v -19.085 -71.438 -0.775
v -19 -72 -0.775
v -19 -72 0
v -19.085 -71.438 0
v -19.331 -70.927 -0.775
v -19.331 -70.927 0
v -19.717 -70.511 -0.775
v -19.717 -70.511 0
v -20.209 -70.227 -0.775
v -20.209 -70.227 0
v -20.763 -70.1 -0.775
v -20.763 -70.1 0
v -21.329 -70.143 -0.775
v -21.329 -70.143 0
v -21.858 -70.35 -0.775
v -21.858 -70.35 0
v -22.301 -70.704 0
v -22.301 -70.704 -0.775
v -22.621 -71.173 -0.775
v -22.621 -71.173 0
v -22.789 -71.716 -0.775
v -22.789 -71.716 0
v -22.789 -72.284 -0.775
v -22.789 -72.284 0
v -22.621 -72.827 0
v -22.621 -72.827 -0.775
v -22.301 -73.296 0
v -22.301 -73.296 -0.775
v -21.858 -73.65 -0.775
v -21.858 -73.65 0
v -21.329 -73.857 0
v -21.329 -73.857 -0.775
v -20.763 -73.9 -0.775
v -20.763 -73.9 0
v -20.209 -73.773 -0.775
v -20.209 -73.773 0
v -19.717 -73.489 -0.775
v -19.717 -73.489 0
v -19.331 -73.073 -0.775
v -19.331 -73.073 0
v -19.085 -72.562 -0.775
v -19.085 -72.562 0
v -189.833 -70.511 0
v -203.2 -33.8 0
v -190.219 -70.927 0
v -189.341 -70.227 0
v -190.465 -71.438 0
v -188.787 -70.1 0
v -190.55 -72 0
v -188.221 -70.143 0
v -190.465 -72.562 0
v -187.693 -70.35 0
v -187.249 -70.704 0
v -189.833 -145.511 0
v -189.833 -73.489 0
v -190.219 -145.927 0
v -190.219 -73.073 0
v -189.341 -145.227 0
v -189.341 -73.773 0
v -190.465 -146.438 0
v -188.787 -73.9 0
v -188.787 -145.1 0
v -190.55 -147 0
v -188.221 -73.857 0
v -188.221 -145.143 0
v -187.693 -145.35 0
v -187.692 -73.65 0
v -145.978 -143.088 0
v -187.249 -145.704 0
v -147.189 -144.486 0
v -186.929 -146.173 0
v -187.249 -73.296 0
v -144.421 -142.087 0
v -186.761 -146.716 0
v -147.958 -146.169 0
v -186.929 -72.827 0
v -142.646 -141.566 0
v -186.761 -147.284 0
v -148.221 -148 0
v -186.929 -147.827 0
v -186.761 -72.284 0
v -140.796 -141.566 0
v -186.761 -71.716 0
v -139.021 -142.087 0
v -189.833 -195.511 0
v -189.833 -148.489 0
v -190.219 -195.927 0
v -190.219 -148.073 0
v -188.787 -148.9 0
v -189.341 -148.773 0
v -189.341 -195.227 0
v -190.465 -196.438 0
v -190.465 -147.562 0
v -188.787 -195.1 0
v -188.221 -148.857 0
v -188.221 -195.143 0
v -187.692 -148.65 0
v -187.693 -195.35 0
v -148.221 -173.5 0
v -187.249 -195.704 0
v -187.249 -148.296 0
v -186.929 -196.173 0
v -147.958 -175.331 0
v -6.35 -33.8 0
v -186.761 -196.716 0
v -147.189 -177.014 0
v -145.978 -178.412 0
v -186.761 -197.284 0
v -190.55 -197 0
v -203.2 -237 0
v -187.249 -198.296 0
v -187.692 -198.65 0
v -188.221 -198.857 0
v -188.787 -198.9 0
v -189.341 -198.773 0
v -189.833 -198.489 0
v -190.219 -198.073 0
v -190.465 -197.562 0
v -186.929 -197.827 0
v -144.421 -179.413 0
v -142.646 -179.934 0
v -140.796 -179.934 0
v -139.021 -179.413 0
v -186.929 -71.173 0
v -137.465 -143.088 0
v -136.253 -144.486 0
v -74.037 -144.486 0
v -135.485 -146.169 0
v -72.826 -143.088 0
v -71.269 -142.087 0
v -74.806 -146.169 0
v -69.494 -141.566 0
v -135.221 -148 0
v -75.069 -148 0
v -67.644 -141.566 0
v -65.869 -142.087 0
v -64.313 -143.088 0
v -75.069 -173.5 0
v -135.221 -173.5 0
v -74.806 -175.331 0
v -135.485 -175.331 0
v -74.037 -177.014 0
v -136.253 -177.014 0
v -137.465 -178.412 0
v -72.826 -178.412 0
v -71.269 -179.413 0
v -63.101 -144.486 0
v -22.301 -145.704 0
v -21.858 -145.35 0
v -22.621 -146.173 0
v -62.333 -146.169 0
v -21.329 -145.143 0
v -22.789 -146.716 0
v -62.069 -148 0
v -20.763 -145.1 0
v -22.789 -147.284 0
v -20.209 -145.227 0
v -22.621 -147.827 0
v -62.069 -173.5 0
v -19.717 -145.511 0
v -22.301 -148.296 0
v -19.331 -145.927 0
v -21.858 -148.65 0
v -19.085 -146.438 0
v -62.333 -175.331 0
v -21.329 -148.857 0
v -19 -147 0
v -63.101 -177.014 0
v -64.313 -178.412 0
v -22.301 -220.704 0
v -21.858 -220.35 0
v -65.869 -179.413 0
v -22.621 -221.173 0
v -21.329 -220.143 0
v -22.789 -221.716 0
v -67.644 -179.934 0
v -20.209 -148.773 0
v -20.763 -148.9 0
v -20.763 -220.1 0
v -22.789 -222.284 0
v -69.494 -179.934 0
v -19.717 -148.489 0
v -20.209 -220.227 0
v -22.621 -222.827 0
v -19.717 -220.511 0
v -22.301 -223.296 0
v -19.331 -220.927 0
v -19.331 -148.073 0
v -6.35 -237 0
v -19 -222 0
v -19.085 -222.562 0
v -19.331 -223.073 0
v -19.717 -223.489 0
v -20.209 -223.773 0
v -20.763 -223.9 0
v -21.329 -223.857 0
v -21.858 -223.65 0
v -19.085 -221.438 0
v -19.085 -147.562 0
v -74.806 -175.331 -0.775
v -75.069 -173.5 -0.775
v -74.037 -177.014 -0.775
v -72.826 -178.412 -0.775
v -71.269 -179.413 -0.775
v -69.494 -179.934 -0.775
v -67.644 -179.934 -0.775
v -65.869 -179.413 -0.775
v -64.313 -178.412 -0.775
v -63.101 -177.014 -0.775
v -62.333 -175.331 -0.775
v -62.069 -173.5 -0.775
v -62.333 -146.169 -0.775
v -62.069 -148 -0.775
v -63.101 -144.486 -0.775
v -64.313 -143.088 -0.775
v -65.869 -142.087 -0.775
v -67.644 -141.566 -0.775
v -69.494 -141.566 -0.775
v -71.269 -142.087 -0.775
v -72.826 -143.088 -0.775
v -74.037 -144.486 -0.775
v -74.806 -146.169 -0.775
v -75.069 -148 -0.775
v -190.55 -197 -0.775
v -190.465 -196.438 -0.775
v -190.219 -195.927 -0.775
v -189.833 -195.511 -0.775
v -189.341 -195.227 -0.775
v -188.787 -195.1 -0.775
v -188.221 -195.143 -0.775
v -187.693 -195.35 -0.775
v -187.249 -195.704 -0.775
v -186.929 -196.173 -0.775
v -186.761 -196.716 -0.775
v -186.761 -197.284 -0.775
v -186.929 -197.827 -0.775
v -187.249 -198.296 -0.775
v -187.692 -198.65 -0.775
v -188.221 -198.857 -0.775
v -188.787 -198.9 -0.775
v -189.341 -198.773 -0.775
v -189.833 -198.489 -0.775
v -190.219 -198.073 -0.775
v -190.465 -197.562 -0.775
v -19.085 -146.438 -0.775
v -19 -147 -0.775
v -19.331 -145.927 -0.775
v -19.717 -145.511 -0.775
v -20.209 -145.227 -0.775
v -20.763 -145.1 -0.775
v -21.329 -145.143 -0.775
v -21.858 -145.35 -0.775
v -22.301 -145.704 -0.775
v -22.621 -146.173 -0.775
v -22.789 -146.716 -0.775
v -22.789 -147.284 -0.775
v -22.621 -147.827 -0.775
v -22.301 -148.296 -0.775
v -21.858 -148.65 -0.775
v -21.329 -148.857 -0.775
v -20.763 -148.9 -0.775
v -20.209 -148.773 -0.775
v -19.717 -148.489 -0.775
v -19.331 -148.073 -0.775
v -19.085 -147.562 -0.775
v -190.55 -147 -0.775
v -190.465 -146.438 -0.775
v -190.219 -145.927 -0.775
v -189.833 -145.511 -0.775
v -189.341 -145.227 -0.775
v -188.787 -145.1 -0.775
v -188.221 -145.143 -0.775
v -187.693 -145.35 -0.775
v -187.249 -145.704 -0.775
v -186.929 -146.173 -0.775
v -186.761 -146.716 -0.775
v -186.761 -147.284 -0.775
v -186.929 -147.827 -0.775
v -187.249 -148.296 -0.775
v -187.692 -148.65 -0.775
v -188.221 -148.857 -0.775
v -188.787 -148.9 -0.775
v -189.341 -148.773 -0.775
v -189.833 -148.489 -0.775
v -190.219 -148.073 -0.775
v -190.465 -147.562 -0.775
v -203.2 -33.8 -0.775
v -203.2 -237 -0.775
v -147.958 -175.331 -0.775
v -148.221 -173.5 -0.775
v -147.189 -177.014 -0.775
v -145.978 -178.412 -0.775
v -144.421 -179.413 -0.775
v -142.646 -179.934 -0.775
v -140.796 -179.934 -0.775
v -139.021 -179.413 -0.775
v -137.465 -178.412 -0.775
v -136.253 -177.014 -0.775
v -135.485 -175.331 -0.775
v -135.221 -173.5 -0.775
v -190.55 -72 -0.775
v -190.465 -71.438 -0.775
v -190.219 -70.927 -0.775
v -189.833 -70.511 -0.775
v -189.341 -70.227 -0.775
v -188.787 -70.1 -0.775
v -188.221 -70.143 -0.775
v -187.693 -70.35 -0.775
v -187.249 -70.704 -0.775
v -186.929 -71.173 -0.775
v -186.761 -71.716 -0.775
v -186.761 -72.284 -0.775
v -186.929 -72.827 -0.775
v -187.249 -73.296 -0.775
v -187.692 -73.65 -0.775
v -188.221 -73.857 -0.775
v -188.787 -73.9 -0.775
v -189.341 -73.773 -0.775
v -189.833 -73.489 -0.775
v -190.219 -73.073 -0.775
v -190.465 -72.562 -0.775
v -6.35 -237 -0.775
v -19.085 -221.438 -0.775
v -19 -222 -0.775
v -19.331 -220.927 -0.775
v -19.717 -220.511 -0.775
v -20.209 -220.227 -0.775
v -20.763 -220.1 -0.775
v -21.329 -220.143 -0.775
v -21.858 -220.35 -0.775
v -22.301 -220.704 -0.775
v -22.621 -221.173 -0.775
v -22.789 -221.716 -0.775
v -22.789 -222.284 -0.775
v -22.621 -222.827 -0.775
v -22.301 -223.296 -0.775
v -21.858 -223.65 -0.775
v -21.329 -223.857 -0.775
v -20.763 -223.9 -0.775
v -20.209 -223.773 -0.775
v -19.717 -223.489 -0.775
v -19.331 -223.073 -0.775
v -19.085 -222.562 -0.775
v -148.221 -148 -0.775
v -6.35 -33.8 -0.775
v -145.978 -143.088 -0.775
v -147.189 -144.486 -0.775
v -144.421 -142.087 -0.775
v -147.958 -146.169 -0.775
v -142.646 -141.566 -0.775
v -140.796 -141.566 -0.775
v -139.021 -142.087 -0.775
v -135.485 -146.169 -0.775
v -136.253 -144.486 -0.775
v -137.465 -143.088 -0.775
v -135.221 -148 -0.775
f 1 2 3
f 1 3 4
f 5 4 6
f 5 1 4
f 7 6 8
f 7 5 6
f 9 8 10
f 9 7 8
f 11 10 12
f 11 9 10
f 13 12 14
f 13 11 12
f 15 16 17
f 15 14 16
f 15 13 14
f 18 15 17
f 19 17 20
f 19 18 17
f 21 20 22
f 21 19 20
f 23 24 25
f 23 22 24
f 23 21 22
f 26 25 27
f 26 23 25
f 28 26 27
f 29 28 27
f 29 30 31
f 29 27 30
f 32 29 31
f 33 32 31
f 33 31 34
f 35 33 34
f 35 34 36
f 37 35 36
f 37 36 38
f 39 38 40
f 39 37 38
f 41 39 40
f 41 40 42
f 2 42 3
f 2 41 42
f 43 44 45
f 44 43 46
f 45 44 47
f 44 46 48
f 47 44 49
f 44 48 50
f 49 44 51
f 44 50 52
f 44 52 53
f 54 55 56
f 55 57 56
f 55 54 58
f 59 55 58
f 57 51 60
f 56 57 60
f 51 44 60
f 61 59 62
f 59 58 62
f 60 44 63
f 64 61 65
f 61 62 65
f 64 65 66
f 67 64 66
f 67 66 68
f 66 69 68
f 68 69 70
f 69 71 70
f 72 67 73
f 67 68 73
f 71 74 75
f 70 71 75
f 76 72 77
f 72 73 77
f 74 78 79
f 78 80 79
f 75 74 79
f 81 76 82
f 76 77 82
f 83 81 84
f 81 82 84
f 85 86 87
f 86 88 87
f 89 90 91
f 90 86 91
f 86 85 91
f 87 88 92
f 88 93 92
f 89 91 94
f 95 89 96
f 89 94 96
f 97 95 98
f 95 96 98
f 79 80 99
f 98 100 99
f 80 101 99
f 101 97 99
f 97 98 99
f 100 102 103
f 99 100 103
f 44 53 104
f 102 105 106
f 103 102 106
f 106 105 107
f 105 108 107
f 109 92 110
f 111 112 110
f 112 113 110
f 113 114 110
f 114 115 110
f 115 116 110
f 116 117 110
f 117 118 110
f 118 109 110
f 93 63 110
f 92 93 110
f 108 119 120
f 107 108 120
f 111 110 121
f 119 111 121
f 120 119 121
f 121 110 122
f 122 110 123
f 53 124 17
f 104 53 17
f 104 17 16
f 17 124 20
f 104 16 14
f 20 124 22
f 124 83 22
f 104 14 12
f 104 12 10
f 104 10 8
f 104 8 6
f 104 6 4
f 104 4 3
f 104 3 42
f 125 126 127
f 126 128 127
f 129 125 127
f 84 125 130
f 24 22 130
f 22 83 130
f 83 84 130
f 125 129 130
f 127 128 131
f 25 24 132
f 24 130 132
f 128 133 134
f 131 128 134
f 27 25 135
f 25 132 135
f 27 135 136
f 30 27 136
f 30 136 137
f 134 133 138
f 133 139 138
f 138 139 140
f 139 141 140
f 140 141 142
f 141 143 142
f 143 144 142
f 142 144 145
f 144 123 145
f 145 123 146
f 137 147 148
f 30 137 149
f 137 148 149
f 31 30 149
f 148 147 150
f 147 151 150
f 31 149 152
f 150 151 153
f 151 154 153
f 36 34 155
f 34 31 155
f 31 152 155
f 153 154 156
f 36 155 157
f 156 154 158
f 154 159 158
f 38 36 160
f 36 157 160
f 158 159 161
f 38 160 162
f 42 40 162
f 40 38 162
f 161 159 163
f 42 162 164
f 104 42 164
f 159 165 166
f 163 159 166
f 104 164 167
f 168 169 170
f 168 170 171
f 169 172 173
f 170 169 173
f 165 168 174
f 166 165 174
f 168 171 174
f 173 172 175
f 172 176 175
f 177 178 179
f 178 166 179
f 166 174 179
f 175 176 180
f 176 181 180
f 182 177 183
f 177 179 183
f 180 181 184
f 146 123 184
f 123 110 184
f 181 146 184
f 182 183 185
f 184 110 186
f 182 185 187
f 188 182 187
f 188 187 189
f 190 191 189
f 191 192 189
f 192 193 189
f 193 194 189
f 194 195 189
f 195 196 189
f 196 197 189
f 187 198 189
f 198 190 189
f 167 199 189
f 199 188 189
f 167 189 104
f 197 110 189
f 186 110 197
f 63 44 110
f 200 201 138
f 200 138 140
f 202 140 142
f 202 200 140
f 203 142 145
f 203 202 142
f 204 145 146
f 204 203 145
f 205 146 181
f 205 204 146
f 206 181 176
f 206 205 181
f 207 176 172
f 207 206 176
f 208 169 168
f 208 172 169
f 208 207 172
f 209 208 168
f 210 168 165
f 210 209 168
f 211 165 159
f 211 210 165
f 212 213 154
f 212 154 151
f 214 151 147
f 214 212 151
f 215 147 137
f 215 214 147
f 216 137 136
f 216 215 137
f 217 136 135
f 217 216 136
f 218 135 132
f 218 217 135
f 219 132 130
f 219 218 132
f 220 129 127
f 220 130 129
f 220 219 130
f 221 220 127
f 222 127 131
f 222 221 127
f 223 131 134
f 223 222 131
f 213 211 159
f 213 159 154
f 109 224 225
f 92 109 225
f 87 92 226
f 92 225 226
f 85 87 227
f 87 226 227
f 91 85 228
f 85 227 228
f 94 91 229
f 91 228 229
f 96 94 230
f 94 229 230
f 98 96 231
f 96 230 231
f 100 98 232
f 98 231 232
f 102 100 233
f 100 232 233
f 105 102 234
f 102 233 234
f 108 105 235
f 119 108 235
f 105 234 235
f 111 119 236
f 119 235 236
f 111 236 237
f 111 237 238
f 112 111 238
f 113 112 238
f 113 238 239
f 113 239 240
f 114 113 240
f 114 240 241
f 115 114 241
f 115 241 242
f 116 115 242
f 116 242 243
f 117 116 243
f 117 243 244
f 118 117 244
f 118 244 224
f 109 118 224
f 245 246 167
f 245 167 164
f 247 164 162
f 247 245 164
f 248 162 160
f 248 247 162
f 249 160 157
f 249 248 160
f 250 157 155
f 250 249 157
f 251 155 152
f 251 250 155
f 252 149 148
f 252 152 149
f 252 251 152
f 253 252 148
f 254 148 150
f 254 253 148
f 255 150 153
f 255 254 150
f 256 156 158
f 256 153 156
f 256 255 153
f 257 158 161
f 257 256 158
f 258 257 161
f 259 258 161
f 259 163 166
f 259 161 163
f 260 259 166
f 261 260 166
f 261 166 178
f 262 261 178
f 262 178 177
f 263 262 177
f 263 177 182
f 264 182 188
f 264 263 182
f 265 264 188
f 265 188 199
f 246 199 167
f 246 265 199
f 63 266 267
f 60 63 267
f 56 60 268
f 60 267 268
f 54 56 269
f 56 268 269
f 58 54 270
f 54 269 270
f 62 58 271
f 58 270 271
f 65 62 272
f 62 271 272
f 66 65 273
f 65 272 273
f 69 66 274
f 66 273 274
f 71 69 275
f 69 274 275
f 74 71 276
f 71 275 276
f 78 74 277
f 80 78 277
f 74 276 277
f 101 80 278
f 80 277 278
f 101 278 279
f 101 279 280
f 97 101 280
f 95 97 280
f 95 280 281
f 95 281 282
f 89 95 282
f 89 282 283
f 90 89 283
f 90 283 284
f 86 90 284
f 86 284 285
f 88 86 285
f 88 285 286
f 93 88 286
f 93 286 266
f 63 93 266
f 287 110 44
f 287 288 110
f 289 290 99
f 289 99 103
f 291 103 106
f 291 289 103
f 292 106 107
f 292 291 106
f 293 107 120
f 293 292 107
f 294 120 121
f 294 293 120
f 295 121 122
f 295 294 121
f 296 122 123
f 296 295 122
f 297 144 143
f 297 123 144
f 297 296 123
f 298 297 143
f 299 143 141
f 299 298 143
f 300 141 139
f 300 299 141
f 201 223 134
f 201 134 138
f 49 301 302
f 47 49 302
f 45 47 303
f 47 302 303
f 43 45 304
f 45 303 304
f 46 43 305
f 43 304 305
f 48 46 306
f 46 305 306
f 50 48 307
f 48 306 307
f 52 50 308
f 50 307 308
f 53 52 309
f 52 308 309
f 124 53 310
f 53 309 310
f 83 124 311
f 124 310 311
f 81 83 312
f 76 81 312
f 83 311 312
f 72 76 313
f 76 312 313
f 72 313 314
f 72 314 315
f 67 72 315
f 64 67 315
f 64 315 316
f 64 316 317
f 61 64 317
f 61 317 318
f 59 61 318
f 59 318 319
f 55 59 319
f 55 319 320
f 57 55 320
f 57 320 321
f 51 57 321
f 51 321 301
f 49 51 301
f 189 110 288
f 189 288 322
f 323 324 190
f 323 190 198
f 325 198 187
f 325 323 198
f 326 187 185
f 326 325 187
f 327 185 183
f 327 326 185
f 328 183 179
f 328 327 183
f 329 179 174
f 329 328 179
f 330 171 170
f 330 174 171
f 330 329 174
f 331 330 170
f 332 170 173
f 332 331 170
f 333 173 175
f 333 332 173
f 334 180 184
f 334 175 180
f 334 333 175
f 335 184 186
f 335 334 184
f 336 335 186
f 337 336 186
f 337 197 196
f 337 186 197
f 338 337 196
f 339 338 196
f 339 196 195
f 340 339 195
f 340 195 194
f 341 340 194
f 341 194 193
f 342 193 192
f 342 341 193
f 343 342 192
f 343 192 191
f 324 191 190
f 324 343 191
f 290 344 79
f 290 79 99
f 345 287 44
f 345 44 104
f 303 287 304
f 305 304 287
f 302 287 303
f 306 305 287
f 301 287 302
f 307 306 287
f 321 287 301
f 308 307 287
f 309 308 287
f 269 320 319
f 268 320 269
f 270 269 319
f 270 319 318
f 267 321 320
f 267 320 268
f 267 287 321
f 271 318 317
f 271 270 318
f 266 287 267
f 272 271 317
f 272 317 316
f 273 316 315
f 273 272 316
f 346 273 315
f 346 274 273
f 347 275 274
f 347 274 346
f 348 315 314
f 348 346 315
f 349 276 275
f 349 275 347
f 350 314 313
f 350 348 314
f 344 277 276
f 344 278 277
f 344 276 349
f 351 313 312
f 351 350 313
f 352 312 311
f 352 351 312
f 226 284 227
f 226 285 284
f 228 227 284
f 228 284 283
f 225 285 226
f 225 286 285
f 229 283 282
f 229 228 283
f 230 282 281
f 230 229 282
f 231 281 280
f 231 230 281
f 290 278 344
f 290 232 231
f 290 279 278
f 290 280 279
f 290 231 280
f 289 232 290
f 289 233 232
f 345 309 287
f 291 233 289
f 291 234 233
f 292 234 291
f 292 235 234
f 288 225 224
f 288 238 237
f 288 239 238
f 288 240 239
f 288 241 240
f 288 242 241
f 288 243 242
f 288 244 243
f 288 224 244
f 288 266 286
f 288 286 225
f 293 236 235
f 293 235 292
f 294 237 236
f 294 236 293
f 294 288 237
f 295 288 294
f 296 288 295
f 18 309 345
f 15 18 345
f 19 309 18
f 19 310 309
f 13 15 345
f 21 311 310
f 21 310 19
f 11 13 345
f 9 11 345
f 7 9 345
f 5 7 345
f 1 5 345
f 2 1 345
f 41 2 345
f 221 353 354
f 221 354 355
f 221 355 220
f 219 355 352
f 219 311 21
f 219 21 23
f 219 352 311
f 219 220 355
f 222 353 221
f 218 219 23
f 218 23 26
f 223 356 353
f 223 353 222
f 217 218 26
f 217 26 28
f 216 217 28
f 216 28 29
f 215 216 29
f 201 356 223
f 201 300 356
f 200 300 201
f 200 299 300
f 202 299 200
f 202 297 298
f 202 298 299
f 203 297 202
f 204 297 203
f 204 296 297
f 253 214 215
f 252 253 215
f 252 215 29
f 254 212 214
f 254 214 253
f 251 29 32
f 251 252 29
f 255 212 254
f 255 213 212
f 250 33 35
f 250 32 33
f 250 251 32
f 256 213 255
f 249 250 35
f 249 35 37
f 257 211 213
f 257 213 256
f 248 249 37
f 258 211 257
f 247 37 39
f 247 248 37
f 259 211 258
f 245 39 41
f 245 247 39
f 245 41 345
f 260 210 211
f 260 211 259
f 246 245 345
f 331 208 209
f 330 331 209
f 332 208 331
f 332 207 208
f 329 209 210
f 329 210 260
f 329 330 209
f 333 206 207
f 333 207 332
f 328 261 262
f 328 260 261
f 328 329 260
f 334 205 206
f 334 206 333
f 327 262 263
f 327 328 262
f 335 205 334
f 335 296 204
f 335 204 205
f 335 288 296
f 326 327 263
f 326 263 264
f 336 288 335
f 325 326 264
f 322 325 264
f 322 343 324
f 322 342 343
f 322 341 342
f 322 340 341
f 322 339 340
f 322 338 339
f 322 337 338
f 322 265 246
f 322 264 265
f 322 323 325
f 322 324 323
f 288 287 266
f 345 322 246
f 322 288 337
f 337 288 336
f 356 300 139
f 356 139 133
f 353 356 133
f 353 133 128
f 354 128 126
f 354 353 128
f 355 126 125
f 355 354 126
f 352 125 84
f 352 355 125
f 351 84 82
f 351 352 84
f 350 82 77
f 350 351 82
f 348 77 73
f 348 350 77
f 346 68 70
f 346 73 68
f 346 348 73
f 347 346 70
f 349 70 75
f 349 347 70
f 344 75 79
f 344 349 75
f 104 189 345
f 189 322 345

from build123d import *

# Parameters (mm, degrees)
SKETCH1_W                             = 196.85
SKETCH1_H                             = 203.2
BOSS_EXTRUDE1_DEPTH                   = 0.7747
CUT_EXTRUDE7_DEPTH                    = 1.7747
SKETCH4_W                             = 196.85
SKETCH4_H                             = 0.6096
BOSS_EXTRUDE2_DEPTH                   = 12
SKETCH14_W                            = 196.85
SKETCH14_H                            = 11.938
BOSS_EXTRUDE3_DEPTH                   = 0.7747
SKETCH13_W                            = 196.85
SKETCH13_H                            = 0.6096
CUT_EXTRUDE9_DEPTH                    = 12
CSK_FOR_M3_FLAT_HEAD_MACHINE_SCREW3_D = 3.81
SKETCH19_W                            = 182.676330849
SKETCH19_H                            = 33.741187375
BOSS_EXTRUDE4_DEPTH                   = 0.7747
SKETCH21_W                            = 22.718000829
SKETCH21_H                            = 22.312299049
SKETCH21_W_2                          = 21.538835619
SKETCH21_H_2                          = 16.643270878
BOSS_EXTRUDE5_DEPTH                   = 0.7747
SKETCH22_W                            = 13.90531837
SKETCH22_H                            = 14.215216999
SKETCH22_W_2                          = 12.509578485
SKETCH22_H_2                          = 9.075576548
BOSS_EXTRUDE6_DEPTH                   = 0.7747


with BuildPart() as part:
    # Sketch1 → Boss-Extrude1 (new body)
    with BuildSketch(Plane(origin=(0, 0, 0), x_dir=(1, 0, 0), z_dir=(0, 0, -1))):
        with Locations((-104.775, 135.4)):
            Rectangle(SKETCH1_W, SKETCH1_H)
    extrude(amount=BOSS_EXTRUDE1_DEPTH)

    # Sketch2 → Cut-Extrude7 (cut, through all)
    with BuildSketch(Plane(origin=(0, 0, -0.7747), x_dir=(1, 0, 0), z_dir=(0, 0, -1))):
        with BuildLine():
            Line((-135.221253236, 173.5), (-135.221253236, 148))
            ThreePointArc((-135.221253236, 148), (-141.721253236, 141.5), (-148.221253236, 148))
            Line((-148.221253236, 148), (-148.221253236, 173.5))
            ThreePointArc((-148.221253236, 173.5), (-141.721253236, 180), (-135.221253236, 173.5))
        make_face()
        with BuildLine():
            Line((-62.069253236, 173.5), (-62.069253236, 148))
            ThreePointArc((-62.069253236, 148), (-68.569253236, 141.5), (-75.069253236, 148))
            Line((-75.069253236, 148), (-75.069253236, 173.5))
            ThreePointArc((-75.069253236, 173.5), (-68.569253236, 180), (-62.069253236, 173.5))
        make_face()
    extrude(amount=-CUT_EXTRUDE7_DEPTH, mode=Mode.SUBTRACT)

    # Sketch4 → Boss-Extrude2 (add)
    with BuildSketch(Plane.XY):
        with Locations((-104.775, -34.1048)):
            Rectangle(SKETCH4_W, SKETCH4_H)
    extrude(amount=BOSS_EXTRUDE2_DEPTH)

    # Sketch14 → Boss-Extrude3 (add)
    with BuildSketch(Plane.XY):
        with Locations((-104.775, -53.935004147)):
            Rectangle(SKETCH14_W, SKETCH14_H)
    extrude(amount=-BOSS_EXTRUDE3_DEPTH)

    # Sketch13 → Cut-Extrude9 (cut)
    with BuildSketch(Plane.XY.offset(12)):
        with Locations((-104.775, -34.1048)):
            Rectangle(SKETCH13_W, SKETCH13_H)
    extrude(amount=-CUT_EXTRUDE9_DEPTH, mode=Mode.SUBTRACT)

    # CSK for M3 Flat Head Machine Screw3 (through all)
    with Locations(Plane.XY):
        with Locations((-188.645, -72), (-188.645, -222), (-188.645, -197), (-188.645, -172), (-188.645, -147), (-188.645, -122), (-188.645, -97)):
            csk_for_m3_flat_head_machine_screw3 = Hole(CSK_FOR_M3_FLAT_HEAD_MACHINE_SCREW3_D / 2)

    # Mirror1: CSK for M3 Flat Head Machine Screw3 across plane
    add(csk_for_m3_flat_head_machine_screw3.mirror(Plane(origin=(-104.775, 0, 0), x_dir=(0, 0, 1), z_dir=(1, 0, 0))), mode=Mode.SUBTRACT)

    # Sketch19 → Boss-Extrude4 (add)
    with BuildSketch(Plane(origin=(0, 0, -0.7747), x_dir=(-1, 0, 0), z_dir=(0, 0, -1))):
        with Locations((101.266706015, -109.837466763)):
            Rectangle(SKETCH19_W, SKETCH19_H)
    extrude(amount=-BOSS_EXTRUDE4_DEPTH)

    # Sketch21 → Boss-Extrude5 (add)
    with BuildSketch(Plane(origin=(0, 0, -0.7747), x_dir=(-1, 0, 0), z_dir=(0, 0, -1))):
        with Locations((185.571692861, -170.919383368)):
            Rectangle(SKETCH21_W, SKETCH21_H)
        with Locations((24.271371833, -173.753897453)):
            Rectangle(SKETCH21_W_2, SKETCH21_H_2)
    extrude(amount=-BOSS_EXTRUDE5_DEPTH)

    # Sketch22 → Boss-Extrude6 (add)
    with BuildSketch(Plane.XY):
        with Locations((-189.313880795, -220.883843828)):
            Rectangle(SKETCH22_W, SKETCH22_H)
        with Locations((-23.670028487, -197.876391374)):
            Rectangle(SKETCH22_W_2, SKETCH22_H_2)
    extrude(amount=-BOSS_EXTRUDE6_DEPTH)


solid = part.part
